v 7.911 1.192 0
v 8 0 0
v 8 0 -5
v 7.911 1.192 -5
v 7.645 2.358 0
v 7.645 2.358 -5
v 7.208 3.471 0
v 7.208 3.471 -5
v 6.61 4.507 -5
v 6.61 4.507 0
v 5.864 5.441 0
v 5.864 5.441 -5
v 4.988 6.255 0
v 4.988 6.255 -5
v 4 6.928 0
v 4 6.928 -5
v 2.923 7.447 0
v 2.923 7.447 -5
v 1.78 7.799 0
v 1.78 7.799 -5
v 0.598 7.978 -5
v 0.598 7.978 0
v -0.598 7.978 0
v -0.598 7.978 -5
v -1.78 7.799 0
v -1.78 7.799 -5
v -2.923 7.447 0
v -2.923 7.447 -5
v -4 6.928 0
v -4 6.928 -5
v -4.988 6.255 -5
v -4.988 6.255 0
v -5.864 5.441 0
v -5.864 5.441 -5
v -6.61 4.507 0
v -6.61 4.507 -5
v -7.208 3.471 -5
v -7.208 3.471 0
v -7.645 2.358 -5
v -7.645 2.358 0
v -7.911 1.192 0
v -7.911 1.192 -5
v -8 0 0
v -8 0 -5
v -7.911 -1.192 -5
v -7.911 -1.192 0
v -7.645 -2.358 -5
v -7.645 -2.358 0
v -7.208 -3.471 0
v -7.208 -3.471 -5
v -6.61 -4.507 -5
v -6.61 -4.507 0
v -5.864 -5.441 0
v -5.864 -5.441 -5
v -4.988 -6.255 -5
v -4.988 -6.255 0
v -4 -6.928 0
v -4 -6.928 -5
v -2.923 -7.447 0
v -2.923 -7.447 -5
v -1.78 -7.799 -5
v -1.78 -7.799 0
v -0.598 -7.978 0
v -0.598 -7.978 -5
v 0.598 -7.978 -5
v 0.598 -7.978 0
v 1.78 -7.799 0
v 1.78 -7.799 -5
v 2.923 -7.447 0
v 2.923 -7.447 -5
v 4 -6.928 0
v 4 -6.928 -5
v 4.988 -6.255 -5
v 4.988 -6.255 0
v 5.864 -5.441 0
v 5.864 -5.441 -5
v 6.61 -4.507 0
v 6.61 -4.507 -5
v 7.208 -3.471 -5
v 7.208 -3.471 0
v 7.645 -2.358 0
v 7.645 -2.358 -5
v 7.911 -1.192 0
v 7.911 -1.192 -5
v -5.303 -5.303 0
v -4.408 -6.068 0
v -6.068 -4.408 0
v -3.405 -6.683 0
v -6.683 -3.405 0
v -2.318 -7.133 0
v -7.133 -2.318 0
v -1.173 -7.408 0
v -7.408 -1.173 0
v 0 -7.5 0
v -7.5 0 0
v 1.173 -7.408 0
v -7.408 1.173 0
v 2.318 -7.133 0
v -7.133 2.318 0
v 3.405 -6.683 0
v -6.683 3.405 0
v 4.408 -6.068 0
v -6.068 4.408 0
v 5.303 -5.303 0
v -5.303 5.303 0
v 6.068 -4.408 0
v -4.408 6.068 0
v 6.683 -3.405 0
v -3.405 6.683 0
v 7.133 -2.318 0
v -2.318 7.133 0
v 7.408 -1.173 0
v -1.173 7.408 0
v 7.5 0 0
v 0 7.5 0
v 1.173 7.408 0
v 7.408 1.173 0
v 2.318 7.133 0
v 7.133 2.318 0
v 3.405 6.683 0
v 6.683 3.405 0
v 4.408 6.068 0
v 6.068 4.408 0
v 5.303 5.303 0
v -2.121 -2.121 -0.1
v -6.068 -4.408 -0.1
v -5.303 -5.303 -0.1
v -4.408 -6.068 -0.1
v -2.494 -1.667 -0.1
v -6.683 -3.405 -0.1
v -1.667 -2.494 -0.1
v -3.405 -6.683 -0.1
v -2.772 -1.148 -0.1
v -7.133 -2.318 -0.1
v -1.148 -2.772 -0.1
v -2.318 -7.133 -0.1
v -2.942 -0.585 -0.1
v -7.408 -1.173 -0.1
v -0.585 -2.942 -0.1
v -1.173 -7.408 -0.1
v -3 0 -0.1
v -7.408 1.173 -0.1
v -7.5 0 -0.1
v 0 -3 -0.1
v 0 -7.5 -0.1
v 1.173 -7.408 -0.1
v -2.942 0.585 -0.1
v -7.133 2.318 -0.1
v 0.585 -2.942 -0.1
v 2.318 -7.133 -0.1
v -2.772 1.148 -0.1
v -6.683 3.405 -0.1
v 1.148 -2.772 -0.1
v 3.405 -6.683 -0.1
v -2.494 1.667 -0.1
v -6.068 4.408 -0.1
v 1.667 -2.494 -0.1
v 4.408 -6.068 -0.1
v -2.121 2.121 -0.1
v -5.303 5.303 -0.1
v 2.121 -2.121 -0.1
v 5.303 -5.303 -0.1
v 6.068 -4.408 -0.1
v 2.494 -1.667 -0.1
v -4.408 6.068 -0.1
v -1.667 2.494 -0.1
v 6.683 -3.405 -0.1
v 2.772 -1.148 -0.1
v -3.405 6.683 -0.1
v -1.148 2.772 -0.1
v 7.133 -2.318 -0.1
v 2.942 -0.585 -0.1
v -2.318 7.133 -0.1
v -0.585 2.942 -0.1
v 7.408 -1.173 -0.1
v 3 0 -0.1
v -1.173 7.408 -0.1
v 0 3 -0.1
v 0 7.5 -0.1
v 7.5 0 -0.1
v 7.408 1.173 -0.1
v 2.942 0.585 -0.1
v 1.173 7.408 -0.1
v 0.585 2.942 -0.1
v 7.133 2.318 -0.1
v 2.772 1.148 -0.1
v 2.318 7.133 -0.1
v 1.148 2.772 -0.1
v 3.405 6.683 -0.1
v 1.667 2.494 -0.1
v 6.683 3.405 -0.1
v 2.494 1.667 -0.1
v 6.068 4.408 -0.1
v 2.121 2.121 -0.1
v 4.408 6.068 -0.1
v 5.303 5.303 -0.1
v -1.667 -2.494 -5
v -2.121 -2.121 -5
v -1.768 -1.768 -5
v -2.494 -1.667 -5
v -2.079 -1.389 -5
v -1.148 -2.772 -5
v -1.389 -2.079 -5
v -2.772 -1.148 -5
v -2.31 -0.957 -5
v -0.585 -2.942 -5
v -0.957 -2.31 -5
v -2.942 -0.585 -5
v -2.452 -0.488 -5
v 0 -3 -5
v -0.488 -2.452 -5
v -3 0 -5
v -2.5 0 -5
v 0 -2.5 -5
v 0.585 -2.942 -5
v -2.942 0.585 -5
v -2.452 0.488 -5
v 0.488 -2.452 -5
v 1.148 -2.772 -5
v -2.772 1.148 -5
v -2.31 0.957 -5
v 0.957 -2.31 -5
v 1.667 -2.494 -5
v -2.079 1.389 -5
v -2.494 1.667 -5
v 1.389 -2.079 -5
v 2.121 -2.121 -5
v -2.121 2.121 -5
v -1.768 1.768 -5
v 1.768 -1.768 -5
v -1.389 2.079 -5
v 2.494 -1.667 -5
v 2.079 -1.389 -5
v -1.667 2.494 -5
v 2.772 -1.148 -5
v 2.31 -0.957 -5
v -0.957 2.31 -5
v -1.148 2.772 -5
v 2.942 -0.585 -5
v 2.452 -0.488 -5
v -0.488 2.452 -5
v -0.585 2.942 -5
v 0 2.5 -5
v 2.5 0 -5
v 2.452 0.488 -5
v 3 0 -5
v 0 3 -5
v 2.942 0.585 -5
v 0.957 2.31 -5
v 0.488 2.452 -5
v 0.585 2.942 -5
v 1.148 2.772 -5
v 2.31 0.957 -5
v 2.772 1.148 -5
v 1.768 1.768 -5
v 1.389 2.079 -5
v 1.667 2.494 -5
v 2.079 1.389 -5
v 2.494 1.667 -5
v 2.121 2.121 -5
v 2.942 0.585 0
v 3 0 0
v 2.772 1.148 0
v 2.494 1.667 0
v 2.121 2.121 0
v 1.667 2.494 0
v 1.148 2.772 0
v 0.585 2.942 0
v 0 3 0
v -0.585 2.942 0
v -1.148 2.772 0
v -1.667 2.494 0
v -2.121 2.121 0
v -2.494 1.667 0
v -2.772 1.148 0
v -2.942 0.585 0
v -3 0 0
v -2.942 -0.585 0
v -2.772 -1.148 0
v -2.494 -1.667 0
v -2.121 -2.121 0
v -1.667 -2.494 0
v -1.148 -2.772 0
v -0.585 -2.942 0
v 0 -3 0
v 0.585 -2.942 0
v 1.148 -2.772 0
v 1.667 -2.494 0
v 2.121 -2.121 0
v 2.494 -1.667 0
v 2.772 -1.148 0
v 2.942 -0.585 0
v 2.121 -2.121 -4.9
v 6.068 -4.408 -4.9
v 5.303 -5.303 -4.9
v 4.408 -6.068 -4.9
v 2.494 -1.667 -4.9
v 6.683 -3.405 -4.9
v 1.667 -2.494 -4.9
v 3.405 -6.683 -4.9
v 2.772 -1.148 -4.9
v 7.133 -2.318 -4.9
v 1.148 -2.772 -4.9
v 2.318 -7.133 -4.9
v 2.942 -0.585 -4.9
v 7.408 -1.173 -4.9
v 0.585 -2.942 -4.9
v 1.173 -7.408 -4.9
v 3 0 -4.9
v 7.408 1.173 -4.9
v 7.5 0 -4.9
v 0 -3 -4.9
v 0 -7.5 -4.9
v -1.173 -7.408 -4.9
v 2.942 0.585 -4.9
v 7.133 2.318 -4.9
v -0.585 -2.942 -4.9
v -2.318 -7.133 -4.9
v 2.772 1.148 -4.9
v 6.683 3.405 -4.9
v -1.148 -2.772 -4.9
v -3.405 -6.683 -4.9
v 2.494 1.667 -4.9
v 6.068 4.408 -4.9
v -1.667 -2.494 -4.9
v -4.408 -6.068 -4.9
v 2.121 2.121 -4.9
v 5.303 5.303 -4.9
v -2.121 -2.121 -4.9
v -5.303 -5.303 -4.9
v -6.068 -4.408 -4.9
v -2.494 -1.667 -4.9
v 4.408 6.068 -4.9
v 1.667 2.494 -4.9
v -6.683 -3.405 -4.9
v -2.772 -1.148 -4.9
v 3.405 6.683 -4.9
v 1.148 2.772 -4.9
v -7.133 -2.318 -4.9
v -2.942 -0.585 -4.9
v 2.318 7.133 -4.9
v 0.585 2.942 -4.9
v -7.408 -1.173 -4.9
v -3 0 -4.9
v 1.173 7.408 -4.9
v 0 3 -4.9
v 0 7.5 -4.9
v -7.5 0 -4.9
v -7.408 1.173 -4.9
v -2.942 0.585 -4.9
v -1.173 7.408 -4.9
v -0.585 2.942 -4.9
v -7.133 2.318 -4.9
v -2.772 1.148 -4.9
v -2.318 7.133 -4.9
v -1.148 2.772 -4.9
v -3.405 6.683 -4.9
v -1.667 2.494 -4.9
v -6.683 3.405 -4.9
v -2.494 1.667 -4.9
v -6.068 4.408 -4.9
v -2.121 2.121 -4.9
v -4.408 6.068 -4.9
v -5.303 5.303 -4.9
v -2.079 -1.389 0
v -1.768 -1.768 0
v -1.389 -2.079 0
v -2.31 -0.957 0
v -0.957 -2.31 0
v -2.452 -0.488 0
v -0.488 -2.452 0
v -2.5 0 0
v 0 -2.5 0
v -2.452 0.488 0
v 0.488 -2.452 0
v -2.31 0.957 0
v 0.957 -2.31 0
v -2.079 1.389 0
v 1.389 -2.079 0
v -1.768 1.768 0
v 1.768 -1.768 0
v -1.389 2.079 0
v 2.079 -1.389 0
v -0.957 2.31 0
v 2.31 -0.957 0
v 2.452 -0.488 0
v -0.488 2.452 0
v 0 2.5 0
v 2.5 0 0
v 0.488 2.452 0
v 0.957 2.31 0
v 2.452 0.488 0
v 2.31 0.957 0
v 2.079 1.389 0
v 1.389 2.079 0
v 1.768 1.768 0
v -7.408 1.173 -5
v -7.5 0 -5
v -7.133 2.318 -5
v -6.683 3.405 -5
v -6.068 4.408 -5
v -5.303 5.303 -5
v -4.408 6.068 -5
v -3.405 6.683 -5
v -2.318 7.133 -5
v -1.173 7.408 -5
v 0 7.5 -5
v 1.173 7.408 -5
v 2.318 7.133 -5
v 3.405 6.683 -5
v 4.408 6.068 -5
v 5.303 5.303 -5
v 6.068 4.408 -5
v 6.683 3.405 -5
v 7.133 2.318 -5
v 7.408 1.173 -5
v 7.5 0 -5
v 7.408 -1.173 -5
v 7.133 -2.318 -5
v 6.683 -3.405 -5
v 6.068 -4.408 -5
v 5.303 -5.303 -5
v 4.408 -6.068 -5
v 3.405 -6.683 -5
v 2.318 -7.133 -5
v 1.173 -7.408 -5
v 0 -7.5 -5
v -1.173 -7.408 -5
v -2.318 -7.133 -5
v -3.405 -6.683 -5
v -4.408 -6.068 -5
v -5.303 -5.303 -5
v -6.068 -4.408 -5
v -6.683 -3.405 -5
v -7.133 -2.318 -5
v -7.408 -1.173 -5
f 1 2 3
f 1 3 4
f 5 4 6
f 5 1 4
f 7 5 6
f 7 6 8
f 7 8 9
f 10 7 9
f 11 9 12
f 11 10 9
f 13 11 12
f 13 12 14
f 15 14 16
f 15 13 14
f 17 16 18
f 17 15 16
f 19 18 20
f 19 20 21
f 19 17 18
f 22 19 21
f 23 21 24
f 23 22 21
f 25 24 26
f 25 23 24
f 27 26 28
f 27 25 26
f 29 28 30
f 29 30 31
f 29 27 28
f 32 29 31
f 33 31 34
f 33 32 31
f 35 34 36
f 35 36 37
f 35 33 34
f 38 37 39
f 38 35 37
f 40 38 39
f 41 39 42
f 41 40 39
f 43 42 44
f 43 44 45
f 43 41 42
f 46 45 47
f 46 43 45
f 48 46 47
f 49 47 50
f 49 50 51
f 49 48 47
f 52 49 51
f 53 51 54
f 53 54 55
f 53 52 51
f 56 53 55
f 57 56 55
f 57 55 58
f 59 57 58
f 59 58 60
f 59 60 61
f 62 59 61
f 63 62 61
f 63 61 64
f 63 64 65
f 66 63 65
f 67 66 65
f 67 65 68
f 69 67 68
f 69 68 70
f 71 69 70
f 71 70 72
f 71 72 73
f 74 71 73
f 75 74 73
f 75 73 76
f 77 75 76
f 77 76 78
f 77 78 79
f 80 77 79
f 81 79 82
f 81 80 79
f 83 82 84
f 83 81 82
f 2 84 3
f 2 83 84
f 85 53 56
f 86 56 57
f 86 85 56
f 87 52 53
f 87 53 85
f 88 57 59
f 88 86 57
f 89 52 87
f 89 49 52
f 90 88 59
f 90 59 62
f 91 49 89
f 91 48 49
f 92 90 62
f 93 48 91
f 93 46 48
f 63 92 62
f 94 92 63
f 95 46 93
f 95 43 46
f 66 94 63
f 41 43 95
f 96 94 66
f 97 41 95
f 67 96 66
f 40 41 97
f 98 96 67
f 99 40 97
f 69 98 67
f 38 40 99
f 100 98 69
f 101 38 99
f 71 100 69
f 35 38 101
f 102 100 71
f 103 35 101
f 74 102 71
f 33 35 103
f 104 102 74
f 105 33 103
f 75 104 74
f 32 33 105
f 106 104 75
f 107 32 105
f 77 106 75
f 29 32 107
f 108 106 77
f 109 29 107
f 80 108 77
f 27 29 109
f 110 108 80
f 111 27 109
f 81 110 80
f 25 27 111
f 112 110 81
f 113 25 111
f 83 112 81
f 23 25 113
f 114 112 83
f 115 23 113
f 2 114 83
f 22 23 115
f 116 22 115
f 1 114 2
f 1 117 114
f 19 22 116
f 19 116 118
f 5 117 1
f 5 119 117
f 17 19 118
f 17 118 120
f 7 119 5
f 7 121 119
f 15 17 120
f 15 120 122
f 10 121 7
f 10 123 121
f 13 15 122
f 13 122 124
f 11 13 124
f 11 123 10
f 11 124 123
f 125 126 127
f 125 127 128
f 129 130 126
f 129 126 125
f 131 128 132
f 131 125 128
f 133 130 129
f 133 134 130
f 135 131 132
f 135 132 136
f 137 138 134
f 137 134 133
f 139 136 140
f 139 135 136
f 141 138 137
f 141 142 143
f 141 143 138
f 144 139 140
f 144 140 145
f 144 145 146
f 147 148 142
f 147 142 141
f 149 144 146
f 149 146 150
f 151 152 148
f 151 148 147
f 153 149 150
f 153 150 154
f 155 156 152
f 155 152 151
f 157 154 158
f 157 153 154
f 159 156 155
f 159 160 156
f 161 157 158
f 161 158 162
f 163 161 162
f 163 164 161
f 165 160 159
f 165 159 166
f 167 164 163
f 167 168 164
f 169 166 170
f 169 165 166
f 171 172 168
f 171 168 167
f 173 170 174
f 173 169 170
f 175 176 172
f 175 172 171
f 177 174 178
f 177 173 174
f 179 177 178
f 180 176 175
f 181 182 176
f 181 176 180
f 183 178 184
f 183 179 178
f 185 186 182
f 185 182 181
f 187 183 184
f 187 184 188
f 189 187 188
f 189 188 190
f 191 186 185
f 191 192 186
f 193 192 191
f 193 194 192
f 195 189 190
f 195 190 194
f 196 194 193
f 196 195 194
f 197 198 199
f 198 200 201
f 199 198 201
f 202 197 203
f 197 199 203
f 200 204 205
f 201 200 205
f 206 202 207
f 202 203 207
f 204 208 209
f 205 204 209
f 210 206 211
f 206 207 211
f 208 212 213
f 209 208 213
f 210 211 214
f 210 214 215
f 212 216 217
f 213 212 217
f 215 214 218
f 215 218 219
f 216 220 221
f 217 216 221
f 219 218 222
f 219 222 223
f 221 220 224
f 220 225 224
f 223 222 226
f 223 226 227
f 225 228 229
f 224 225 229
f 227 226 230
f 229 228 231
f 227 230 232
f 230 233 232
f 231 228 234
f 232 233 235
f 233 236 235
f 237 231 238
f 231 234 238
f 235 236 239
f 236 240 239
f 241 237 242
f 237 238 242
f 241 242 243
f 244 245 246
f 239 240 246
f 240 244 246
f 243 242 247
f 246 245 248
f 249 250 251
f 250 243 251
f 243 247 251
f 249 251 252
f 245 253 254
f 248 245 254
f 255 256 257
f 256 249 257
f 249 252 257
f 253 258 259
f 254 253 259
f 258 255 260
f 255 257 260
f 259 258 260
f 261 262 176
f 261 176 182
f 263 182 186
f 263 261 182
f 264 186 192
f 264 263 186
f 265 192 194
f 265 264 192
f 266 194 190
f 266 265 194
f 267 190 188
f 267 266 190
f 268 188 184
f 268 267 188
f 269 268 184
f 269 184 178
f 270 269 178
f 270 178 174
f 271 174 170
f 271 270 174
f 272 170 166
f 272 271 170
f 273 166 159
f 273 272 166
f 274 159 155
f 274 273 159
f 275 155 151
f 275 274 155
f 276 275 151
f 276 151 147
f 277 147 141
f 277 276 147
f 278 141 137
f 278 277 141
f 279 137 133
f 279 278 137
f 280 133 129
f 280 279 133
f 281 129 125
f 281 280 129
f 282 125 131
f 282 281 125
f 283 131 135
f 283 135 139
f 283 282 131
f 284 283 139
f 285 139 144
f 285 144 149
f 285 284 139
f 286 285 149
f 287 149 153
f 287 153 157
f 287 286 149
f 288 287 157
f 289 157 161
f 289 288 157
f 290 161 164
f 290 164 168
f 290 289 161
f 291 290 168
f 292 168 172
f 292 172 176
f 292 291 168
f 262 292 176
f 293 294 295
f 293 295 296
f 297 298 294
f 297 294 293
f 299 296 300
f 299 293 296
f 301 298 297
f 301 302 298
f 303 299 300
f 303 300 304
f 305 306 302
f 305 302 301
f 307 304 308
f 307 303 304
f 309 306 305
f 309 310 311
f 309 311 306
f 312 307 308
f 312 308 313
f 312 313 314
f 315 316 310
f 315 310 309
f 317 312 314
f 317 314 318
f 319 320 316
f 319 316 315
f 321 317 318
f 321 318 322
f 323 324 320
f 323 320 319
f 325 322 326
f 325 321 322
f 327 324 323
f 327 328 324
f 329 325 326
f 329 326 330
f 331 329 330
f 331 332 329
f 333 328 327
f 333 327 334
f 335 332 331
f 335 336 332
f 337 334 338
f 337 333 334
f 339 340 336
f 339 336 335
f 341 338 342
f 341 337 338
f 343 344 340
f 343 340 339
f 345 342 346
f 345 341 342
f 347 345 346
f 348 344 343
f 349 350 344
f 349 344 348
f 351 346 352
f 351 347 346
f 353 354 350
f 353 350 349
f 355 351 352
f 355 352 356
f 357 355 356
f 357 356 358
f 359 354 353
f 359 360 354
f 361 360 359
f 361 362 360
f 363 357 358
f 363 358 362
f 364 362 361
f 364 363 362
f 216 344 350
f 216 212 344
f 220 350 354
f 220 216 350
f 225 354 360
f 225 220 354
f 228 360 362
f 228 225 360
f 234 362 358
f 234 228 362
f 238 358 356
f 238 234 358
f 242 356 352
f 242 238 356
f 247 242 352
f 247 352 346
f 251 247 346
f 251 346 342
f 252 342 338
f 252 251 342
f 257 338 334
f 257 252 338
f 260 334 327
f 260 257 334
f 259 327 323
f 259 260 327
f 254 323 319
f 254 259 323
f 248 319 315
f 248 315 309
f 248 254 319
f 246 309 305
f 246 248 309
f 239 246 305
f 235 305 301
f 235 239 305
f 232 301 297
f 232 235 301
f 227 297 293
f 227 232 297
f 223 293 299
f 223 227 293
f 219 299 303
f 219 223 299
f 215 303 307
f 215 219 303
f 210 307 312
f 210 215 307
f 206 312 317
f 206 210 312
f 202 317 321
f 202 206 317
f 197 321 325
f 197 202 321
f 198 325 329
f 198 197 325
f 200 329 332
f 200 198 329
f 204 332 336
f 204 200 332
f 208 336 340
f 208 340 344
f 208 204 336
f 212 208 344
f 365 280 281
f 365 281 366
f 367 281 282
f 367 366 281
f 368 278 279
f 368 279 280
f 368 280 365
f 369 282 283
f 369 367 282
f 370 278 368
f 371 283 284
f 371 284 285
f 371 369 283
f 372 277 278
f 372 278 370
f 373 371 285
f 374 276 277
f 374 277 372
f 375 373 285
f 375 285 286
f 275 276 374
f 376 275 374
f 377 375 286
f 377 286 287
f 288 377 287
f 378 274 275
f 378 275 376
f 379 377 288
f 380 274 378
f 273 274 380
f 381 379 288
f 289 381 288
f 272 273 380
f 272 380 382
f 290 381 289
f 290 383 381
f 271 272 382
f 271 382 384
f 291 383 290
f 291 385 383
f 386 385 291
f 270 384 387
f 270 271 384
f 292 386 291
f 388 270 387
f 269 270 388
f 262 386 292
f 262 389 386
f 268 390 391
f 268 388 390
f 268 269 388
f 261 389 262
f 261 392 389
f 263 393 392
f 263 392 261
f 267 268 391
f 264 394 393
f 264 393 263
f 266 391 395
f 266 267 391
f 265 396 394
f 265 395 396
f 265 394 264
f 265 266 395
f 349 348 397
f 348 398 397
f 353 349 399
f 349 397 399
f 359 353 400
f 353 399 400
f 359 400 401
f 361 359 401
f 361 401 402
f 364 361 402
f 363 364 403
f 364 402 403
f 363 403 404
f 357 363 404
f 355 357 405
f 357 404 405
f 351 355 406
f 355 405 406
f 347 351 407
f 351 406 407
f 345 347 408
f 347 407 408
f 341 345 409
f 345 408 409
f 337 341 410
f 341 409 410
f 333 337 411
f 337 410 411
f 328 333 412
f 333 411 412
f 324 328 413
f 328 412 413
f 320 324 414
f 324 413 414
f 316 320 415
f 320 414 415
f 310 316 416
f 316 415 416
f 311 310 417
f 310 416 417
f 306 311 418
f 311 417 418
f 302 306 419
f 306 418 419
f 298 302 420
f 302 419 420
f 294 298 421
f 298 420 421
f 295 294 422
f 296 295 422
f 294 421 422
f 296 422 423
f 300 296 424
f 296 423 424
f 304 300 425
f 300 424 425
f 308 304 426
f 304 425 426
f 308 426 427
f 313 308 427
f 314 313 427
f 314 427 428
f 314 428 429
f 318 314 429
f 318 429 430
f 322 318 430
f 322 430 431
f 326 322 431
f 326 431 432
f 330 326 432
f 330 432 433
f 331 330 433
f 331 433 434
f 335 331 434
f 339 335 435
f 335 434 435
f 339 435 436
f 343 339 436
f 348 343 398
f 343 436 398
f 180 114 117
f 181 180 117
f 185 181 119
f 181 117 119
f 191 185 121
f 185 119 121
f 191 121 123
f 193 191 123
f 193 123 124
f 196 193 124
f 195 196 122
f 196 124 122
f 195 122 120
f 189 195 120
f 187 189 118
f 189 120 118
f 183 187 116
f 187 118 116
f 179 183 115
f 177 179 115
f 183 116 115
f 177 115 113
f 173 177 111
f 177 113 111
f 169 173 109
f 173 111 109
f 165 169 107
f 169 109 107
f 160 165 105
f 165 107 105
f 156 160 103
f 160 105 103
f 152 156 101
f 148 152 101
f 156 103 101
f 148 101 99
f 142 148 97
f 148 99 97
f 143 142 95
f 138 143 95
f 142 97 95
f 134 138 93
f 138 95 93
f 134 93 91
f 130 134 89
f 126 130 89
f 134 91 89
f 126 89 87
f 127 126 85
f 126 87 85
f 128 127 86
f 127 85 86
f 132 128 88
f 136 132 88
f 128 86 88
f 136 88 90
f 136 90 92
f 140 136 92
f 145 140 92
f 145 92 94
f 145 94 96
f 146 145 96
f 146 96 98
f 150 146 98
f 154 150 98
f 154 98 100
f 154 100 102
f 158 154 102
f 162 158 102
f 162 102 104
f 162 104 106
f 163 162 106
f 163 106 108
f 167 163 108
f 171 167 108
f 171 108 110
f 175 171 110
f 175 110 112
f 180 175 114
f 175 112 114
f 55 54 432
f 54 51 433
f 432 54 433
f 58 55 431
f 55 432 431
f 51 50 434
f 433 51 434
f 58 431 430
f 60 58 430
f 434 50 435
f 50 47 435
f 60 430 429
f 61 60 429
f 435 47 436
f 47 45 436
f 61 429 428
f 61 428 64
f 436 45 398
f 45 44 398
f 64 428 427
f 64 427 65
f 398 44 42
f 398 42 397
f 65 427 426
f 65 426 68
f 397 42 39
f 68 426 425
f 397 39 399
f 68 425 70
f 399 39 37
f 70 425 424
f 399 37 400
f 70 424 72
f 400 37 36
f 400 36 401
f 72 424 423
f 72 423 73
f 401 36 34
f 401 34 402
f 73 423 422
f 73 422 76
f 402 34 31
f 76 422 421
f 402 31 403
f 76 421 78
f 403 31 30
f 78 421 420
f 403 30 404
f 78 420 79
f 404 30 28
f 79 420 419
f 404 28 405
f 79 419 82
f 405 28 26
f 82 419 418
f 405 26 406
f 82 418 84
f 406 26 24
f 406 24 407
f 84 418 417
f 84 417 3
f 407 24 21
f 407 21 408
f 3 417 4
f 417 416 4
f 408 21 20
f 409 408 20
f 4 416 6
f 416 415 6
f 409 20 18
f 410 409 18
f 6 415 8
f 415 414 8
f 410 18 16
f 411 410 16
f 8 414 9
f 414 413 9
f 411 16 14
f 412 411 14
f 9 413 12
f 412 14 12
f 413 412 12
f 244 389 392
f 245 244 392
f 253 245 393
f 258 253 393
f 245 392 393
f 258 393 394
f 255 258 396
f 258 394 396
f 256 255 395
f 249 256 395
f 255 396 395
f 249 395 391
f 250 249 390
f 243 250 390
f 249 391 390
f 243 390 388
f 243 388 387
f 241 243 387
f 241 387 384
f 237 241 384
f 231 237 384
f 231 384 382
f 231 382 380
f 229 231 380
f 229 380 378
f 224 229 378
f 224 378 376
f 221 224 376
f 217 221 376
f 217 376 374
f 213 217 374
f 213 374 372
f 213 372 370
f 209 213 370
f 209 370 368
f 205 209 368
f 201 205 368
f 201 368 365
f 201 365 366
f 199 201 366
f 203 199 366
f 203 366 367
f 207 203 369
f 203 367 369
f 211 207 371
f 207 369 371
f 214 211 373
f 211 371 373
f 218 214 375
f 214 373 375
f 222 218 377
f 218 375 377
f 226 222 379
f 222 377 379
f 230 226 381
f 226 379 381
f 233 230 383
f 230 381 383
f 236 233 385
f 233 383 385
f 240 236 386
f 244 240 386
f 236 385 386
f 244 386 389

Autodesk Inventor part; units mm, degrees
ref_plane "YZ Plane" through (0, 0, 0) normal (1, 0, 0) x (0, 1, 0)
ref_plane "XZ Plane" through (0, 0, 0) normal (0, 1, 0) x (-1, 0, 0)
ref_plane "XY Plane" through (0, 0, 0) normal (0, 0, 1) x (1, 0, 0)
sketch "Эскиз1" plane through (0, 0, 0) normal (0, 0, 1) x (1, 0, 0)
  circle A0 centre (0, 0) radius 2.5
  circle A1 centre (0, 0) radius 8
  dimension "d0" = 5
  dimension "d1" = 16
extrude "Выдавливание1" add sketch "Эскиз1" against normal blind 5
sketch "Эскиз4" plane through (0, 0, 0) normal (0, 0, 1) x (1, 0, 0)
  circle A0 centre (0, 0) radius 3
  circle A1 centre (0, 0) radius 7.5
  dimension "d8" = 6
  dimension "d9" = 15
extrude "Выдавливание2" cut sketch "Эскиз4" against normal blind 0.1
sketch "Эскиз5" plane through (0, 0, -5) normal (0, 0, -1) x (-1, 0, 0)
  circle A0 centre (0, 0) radius 3
  circle A1 centre (0, 0) radius 7.5
  dimension "d12" = 6
  dimension "d13" = 15
extrude "Выдавливание3" cut sketch "Эскиз5" against normal blind 0.1
sketch "Эскиз6" plane through (0, 0, -0.1) normal (0, 0, 1) x (1, 0, 0)
  point P0 (0, 0)
properties part number "625RS"
